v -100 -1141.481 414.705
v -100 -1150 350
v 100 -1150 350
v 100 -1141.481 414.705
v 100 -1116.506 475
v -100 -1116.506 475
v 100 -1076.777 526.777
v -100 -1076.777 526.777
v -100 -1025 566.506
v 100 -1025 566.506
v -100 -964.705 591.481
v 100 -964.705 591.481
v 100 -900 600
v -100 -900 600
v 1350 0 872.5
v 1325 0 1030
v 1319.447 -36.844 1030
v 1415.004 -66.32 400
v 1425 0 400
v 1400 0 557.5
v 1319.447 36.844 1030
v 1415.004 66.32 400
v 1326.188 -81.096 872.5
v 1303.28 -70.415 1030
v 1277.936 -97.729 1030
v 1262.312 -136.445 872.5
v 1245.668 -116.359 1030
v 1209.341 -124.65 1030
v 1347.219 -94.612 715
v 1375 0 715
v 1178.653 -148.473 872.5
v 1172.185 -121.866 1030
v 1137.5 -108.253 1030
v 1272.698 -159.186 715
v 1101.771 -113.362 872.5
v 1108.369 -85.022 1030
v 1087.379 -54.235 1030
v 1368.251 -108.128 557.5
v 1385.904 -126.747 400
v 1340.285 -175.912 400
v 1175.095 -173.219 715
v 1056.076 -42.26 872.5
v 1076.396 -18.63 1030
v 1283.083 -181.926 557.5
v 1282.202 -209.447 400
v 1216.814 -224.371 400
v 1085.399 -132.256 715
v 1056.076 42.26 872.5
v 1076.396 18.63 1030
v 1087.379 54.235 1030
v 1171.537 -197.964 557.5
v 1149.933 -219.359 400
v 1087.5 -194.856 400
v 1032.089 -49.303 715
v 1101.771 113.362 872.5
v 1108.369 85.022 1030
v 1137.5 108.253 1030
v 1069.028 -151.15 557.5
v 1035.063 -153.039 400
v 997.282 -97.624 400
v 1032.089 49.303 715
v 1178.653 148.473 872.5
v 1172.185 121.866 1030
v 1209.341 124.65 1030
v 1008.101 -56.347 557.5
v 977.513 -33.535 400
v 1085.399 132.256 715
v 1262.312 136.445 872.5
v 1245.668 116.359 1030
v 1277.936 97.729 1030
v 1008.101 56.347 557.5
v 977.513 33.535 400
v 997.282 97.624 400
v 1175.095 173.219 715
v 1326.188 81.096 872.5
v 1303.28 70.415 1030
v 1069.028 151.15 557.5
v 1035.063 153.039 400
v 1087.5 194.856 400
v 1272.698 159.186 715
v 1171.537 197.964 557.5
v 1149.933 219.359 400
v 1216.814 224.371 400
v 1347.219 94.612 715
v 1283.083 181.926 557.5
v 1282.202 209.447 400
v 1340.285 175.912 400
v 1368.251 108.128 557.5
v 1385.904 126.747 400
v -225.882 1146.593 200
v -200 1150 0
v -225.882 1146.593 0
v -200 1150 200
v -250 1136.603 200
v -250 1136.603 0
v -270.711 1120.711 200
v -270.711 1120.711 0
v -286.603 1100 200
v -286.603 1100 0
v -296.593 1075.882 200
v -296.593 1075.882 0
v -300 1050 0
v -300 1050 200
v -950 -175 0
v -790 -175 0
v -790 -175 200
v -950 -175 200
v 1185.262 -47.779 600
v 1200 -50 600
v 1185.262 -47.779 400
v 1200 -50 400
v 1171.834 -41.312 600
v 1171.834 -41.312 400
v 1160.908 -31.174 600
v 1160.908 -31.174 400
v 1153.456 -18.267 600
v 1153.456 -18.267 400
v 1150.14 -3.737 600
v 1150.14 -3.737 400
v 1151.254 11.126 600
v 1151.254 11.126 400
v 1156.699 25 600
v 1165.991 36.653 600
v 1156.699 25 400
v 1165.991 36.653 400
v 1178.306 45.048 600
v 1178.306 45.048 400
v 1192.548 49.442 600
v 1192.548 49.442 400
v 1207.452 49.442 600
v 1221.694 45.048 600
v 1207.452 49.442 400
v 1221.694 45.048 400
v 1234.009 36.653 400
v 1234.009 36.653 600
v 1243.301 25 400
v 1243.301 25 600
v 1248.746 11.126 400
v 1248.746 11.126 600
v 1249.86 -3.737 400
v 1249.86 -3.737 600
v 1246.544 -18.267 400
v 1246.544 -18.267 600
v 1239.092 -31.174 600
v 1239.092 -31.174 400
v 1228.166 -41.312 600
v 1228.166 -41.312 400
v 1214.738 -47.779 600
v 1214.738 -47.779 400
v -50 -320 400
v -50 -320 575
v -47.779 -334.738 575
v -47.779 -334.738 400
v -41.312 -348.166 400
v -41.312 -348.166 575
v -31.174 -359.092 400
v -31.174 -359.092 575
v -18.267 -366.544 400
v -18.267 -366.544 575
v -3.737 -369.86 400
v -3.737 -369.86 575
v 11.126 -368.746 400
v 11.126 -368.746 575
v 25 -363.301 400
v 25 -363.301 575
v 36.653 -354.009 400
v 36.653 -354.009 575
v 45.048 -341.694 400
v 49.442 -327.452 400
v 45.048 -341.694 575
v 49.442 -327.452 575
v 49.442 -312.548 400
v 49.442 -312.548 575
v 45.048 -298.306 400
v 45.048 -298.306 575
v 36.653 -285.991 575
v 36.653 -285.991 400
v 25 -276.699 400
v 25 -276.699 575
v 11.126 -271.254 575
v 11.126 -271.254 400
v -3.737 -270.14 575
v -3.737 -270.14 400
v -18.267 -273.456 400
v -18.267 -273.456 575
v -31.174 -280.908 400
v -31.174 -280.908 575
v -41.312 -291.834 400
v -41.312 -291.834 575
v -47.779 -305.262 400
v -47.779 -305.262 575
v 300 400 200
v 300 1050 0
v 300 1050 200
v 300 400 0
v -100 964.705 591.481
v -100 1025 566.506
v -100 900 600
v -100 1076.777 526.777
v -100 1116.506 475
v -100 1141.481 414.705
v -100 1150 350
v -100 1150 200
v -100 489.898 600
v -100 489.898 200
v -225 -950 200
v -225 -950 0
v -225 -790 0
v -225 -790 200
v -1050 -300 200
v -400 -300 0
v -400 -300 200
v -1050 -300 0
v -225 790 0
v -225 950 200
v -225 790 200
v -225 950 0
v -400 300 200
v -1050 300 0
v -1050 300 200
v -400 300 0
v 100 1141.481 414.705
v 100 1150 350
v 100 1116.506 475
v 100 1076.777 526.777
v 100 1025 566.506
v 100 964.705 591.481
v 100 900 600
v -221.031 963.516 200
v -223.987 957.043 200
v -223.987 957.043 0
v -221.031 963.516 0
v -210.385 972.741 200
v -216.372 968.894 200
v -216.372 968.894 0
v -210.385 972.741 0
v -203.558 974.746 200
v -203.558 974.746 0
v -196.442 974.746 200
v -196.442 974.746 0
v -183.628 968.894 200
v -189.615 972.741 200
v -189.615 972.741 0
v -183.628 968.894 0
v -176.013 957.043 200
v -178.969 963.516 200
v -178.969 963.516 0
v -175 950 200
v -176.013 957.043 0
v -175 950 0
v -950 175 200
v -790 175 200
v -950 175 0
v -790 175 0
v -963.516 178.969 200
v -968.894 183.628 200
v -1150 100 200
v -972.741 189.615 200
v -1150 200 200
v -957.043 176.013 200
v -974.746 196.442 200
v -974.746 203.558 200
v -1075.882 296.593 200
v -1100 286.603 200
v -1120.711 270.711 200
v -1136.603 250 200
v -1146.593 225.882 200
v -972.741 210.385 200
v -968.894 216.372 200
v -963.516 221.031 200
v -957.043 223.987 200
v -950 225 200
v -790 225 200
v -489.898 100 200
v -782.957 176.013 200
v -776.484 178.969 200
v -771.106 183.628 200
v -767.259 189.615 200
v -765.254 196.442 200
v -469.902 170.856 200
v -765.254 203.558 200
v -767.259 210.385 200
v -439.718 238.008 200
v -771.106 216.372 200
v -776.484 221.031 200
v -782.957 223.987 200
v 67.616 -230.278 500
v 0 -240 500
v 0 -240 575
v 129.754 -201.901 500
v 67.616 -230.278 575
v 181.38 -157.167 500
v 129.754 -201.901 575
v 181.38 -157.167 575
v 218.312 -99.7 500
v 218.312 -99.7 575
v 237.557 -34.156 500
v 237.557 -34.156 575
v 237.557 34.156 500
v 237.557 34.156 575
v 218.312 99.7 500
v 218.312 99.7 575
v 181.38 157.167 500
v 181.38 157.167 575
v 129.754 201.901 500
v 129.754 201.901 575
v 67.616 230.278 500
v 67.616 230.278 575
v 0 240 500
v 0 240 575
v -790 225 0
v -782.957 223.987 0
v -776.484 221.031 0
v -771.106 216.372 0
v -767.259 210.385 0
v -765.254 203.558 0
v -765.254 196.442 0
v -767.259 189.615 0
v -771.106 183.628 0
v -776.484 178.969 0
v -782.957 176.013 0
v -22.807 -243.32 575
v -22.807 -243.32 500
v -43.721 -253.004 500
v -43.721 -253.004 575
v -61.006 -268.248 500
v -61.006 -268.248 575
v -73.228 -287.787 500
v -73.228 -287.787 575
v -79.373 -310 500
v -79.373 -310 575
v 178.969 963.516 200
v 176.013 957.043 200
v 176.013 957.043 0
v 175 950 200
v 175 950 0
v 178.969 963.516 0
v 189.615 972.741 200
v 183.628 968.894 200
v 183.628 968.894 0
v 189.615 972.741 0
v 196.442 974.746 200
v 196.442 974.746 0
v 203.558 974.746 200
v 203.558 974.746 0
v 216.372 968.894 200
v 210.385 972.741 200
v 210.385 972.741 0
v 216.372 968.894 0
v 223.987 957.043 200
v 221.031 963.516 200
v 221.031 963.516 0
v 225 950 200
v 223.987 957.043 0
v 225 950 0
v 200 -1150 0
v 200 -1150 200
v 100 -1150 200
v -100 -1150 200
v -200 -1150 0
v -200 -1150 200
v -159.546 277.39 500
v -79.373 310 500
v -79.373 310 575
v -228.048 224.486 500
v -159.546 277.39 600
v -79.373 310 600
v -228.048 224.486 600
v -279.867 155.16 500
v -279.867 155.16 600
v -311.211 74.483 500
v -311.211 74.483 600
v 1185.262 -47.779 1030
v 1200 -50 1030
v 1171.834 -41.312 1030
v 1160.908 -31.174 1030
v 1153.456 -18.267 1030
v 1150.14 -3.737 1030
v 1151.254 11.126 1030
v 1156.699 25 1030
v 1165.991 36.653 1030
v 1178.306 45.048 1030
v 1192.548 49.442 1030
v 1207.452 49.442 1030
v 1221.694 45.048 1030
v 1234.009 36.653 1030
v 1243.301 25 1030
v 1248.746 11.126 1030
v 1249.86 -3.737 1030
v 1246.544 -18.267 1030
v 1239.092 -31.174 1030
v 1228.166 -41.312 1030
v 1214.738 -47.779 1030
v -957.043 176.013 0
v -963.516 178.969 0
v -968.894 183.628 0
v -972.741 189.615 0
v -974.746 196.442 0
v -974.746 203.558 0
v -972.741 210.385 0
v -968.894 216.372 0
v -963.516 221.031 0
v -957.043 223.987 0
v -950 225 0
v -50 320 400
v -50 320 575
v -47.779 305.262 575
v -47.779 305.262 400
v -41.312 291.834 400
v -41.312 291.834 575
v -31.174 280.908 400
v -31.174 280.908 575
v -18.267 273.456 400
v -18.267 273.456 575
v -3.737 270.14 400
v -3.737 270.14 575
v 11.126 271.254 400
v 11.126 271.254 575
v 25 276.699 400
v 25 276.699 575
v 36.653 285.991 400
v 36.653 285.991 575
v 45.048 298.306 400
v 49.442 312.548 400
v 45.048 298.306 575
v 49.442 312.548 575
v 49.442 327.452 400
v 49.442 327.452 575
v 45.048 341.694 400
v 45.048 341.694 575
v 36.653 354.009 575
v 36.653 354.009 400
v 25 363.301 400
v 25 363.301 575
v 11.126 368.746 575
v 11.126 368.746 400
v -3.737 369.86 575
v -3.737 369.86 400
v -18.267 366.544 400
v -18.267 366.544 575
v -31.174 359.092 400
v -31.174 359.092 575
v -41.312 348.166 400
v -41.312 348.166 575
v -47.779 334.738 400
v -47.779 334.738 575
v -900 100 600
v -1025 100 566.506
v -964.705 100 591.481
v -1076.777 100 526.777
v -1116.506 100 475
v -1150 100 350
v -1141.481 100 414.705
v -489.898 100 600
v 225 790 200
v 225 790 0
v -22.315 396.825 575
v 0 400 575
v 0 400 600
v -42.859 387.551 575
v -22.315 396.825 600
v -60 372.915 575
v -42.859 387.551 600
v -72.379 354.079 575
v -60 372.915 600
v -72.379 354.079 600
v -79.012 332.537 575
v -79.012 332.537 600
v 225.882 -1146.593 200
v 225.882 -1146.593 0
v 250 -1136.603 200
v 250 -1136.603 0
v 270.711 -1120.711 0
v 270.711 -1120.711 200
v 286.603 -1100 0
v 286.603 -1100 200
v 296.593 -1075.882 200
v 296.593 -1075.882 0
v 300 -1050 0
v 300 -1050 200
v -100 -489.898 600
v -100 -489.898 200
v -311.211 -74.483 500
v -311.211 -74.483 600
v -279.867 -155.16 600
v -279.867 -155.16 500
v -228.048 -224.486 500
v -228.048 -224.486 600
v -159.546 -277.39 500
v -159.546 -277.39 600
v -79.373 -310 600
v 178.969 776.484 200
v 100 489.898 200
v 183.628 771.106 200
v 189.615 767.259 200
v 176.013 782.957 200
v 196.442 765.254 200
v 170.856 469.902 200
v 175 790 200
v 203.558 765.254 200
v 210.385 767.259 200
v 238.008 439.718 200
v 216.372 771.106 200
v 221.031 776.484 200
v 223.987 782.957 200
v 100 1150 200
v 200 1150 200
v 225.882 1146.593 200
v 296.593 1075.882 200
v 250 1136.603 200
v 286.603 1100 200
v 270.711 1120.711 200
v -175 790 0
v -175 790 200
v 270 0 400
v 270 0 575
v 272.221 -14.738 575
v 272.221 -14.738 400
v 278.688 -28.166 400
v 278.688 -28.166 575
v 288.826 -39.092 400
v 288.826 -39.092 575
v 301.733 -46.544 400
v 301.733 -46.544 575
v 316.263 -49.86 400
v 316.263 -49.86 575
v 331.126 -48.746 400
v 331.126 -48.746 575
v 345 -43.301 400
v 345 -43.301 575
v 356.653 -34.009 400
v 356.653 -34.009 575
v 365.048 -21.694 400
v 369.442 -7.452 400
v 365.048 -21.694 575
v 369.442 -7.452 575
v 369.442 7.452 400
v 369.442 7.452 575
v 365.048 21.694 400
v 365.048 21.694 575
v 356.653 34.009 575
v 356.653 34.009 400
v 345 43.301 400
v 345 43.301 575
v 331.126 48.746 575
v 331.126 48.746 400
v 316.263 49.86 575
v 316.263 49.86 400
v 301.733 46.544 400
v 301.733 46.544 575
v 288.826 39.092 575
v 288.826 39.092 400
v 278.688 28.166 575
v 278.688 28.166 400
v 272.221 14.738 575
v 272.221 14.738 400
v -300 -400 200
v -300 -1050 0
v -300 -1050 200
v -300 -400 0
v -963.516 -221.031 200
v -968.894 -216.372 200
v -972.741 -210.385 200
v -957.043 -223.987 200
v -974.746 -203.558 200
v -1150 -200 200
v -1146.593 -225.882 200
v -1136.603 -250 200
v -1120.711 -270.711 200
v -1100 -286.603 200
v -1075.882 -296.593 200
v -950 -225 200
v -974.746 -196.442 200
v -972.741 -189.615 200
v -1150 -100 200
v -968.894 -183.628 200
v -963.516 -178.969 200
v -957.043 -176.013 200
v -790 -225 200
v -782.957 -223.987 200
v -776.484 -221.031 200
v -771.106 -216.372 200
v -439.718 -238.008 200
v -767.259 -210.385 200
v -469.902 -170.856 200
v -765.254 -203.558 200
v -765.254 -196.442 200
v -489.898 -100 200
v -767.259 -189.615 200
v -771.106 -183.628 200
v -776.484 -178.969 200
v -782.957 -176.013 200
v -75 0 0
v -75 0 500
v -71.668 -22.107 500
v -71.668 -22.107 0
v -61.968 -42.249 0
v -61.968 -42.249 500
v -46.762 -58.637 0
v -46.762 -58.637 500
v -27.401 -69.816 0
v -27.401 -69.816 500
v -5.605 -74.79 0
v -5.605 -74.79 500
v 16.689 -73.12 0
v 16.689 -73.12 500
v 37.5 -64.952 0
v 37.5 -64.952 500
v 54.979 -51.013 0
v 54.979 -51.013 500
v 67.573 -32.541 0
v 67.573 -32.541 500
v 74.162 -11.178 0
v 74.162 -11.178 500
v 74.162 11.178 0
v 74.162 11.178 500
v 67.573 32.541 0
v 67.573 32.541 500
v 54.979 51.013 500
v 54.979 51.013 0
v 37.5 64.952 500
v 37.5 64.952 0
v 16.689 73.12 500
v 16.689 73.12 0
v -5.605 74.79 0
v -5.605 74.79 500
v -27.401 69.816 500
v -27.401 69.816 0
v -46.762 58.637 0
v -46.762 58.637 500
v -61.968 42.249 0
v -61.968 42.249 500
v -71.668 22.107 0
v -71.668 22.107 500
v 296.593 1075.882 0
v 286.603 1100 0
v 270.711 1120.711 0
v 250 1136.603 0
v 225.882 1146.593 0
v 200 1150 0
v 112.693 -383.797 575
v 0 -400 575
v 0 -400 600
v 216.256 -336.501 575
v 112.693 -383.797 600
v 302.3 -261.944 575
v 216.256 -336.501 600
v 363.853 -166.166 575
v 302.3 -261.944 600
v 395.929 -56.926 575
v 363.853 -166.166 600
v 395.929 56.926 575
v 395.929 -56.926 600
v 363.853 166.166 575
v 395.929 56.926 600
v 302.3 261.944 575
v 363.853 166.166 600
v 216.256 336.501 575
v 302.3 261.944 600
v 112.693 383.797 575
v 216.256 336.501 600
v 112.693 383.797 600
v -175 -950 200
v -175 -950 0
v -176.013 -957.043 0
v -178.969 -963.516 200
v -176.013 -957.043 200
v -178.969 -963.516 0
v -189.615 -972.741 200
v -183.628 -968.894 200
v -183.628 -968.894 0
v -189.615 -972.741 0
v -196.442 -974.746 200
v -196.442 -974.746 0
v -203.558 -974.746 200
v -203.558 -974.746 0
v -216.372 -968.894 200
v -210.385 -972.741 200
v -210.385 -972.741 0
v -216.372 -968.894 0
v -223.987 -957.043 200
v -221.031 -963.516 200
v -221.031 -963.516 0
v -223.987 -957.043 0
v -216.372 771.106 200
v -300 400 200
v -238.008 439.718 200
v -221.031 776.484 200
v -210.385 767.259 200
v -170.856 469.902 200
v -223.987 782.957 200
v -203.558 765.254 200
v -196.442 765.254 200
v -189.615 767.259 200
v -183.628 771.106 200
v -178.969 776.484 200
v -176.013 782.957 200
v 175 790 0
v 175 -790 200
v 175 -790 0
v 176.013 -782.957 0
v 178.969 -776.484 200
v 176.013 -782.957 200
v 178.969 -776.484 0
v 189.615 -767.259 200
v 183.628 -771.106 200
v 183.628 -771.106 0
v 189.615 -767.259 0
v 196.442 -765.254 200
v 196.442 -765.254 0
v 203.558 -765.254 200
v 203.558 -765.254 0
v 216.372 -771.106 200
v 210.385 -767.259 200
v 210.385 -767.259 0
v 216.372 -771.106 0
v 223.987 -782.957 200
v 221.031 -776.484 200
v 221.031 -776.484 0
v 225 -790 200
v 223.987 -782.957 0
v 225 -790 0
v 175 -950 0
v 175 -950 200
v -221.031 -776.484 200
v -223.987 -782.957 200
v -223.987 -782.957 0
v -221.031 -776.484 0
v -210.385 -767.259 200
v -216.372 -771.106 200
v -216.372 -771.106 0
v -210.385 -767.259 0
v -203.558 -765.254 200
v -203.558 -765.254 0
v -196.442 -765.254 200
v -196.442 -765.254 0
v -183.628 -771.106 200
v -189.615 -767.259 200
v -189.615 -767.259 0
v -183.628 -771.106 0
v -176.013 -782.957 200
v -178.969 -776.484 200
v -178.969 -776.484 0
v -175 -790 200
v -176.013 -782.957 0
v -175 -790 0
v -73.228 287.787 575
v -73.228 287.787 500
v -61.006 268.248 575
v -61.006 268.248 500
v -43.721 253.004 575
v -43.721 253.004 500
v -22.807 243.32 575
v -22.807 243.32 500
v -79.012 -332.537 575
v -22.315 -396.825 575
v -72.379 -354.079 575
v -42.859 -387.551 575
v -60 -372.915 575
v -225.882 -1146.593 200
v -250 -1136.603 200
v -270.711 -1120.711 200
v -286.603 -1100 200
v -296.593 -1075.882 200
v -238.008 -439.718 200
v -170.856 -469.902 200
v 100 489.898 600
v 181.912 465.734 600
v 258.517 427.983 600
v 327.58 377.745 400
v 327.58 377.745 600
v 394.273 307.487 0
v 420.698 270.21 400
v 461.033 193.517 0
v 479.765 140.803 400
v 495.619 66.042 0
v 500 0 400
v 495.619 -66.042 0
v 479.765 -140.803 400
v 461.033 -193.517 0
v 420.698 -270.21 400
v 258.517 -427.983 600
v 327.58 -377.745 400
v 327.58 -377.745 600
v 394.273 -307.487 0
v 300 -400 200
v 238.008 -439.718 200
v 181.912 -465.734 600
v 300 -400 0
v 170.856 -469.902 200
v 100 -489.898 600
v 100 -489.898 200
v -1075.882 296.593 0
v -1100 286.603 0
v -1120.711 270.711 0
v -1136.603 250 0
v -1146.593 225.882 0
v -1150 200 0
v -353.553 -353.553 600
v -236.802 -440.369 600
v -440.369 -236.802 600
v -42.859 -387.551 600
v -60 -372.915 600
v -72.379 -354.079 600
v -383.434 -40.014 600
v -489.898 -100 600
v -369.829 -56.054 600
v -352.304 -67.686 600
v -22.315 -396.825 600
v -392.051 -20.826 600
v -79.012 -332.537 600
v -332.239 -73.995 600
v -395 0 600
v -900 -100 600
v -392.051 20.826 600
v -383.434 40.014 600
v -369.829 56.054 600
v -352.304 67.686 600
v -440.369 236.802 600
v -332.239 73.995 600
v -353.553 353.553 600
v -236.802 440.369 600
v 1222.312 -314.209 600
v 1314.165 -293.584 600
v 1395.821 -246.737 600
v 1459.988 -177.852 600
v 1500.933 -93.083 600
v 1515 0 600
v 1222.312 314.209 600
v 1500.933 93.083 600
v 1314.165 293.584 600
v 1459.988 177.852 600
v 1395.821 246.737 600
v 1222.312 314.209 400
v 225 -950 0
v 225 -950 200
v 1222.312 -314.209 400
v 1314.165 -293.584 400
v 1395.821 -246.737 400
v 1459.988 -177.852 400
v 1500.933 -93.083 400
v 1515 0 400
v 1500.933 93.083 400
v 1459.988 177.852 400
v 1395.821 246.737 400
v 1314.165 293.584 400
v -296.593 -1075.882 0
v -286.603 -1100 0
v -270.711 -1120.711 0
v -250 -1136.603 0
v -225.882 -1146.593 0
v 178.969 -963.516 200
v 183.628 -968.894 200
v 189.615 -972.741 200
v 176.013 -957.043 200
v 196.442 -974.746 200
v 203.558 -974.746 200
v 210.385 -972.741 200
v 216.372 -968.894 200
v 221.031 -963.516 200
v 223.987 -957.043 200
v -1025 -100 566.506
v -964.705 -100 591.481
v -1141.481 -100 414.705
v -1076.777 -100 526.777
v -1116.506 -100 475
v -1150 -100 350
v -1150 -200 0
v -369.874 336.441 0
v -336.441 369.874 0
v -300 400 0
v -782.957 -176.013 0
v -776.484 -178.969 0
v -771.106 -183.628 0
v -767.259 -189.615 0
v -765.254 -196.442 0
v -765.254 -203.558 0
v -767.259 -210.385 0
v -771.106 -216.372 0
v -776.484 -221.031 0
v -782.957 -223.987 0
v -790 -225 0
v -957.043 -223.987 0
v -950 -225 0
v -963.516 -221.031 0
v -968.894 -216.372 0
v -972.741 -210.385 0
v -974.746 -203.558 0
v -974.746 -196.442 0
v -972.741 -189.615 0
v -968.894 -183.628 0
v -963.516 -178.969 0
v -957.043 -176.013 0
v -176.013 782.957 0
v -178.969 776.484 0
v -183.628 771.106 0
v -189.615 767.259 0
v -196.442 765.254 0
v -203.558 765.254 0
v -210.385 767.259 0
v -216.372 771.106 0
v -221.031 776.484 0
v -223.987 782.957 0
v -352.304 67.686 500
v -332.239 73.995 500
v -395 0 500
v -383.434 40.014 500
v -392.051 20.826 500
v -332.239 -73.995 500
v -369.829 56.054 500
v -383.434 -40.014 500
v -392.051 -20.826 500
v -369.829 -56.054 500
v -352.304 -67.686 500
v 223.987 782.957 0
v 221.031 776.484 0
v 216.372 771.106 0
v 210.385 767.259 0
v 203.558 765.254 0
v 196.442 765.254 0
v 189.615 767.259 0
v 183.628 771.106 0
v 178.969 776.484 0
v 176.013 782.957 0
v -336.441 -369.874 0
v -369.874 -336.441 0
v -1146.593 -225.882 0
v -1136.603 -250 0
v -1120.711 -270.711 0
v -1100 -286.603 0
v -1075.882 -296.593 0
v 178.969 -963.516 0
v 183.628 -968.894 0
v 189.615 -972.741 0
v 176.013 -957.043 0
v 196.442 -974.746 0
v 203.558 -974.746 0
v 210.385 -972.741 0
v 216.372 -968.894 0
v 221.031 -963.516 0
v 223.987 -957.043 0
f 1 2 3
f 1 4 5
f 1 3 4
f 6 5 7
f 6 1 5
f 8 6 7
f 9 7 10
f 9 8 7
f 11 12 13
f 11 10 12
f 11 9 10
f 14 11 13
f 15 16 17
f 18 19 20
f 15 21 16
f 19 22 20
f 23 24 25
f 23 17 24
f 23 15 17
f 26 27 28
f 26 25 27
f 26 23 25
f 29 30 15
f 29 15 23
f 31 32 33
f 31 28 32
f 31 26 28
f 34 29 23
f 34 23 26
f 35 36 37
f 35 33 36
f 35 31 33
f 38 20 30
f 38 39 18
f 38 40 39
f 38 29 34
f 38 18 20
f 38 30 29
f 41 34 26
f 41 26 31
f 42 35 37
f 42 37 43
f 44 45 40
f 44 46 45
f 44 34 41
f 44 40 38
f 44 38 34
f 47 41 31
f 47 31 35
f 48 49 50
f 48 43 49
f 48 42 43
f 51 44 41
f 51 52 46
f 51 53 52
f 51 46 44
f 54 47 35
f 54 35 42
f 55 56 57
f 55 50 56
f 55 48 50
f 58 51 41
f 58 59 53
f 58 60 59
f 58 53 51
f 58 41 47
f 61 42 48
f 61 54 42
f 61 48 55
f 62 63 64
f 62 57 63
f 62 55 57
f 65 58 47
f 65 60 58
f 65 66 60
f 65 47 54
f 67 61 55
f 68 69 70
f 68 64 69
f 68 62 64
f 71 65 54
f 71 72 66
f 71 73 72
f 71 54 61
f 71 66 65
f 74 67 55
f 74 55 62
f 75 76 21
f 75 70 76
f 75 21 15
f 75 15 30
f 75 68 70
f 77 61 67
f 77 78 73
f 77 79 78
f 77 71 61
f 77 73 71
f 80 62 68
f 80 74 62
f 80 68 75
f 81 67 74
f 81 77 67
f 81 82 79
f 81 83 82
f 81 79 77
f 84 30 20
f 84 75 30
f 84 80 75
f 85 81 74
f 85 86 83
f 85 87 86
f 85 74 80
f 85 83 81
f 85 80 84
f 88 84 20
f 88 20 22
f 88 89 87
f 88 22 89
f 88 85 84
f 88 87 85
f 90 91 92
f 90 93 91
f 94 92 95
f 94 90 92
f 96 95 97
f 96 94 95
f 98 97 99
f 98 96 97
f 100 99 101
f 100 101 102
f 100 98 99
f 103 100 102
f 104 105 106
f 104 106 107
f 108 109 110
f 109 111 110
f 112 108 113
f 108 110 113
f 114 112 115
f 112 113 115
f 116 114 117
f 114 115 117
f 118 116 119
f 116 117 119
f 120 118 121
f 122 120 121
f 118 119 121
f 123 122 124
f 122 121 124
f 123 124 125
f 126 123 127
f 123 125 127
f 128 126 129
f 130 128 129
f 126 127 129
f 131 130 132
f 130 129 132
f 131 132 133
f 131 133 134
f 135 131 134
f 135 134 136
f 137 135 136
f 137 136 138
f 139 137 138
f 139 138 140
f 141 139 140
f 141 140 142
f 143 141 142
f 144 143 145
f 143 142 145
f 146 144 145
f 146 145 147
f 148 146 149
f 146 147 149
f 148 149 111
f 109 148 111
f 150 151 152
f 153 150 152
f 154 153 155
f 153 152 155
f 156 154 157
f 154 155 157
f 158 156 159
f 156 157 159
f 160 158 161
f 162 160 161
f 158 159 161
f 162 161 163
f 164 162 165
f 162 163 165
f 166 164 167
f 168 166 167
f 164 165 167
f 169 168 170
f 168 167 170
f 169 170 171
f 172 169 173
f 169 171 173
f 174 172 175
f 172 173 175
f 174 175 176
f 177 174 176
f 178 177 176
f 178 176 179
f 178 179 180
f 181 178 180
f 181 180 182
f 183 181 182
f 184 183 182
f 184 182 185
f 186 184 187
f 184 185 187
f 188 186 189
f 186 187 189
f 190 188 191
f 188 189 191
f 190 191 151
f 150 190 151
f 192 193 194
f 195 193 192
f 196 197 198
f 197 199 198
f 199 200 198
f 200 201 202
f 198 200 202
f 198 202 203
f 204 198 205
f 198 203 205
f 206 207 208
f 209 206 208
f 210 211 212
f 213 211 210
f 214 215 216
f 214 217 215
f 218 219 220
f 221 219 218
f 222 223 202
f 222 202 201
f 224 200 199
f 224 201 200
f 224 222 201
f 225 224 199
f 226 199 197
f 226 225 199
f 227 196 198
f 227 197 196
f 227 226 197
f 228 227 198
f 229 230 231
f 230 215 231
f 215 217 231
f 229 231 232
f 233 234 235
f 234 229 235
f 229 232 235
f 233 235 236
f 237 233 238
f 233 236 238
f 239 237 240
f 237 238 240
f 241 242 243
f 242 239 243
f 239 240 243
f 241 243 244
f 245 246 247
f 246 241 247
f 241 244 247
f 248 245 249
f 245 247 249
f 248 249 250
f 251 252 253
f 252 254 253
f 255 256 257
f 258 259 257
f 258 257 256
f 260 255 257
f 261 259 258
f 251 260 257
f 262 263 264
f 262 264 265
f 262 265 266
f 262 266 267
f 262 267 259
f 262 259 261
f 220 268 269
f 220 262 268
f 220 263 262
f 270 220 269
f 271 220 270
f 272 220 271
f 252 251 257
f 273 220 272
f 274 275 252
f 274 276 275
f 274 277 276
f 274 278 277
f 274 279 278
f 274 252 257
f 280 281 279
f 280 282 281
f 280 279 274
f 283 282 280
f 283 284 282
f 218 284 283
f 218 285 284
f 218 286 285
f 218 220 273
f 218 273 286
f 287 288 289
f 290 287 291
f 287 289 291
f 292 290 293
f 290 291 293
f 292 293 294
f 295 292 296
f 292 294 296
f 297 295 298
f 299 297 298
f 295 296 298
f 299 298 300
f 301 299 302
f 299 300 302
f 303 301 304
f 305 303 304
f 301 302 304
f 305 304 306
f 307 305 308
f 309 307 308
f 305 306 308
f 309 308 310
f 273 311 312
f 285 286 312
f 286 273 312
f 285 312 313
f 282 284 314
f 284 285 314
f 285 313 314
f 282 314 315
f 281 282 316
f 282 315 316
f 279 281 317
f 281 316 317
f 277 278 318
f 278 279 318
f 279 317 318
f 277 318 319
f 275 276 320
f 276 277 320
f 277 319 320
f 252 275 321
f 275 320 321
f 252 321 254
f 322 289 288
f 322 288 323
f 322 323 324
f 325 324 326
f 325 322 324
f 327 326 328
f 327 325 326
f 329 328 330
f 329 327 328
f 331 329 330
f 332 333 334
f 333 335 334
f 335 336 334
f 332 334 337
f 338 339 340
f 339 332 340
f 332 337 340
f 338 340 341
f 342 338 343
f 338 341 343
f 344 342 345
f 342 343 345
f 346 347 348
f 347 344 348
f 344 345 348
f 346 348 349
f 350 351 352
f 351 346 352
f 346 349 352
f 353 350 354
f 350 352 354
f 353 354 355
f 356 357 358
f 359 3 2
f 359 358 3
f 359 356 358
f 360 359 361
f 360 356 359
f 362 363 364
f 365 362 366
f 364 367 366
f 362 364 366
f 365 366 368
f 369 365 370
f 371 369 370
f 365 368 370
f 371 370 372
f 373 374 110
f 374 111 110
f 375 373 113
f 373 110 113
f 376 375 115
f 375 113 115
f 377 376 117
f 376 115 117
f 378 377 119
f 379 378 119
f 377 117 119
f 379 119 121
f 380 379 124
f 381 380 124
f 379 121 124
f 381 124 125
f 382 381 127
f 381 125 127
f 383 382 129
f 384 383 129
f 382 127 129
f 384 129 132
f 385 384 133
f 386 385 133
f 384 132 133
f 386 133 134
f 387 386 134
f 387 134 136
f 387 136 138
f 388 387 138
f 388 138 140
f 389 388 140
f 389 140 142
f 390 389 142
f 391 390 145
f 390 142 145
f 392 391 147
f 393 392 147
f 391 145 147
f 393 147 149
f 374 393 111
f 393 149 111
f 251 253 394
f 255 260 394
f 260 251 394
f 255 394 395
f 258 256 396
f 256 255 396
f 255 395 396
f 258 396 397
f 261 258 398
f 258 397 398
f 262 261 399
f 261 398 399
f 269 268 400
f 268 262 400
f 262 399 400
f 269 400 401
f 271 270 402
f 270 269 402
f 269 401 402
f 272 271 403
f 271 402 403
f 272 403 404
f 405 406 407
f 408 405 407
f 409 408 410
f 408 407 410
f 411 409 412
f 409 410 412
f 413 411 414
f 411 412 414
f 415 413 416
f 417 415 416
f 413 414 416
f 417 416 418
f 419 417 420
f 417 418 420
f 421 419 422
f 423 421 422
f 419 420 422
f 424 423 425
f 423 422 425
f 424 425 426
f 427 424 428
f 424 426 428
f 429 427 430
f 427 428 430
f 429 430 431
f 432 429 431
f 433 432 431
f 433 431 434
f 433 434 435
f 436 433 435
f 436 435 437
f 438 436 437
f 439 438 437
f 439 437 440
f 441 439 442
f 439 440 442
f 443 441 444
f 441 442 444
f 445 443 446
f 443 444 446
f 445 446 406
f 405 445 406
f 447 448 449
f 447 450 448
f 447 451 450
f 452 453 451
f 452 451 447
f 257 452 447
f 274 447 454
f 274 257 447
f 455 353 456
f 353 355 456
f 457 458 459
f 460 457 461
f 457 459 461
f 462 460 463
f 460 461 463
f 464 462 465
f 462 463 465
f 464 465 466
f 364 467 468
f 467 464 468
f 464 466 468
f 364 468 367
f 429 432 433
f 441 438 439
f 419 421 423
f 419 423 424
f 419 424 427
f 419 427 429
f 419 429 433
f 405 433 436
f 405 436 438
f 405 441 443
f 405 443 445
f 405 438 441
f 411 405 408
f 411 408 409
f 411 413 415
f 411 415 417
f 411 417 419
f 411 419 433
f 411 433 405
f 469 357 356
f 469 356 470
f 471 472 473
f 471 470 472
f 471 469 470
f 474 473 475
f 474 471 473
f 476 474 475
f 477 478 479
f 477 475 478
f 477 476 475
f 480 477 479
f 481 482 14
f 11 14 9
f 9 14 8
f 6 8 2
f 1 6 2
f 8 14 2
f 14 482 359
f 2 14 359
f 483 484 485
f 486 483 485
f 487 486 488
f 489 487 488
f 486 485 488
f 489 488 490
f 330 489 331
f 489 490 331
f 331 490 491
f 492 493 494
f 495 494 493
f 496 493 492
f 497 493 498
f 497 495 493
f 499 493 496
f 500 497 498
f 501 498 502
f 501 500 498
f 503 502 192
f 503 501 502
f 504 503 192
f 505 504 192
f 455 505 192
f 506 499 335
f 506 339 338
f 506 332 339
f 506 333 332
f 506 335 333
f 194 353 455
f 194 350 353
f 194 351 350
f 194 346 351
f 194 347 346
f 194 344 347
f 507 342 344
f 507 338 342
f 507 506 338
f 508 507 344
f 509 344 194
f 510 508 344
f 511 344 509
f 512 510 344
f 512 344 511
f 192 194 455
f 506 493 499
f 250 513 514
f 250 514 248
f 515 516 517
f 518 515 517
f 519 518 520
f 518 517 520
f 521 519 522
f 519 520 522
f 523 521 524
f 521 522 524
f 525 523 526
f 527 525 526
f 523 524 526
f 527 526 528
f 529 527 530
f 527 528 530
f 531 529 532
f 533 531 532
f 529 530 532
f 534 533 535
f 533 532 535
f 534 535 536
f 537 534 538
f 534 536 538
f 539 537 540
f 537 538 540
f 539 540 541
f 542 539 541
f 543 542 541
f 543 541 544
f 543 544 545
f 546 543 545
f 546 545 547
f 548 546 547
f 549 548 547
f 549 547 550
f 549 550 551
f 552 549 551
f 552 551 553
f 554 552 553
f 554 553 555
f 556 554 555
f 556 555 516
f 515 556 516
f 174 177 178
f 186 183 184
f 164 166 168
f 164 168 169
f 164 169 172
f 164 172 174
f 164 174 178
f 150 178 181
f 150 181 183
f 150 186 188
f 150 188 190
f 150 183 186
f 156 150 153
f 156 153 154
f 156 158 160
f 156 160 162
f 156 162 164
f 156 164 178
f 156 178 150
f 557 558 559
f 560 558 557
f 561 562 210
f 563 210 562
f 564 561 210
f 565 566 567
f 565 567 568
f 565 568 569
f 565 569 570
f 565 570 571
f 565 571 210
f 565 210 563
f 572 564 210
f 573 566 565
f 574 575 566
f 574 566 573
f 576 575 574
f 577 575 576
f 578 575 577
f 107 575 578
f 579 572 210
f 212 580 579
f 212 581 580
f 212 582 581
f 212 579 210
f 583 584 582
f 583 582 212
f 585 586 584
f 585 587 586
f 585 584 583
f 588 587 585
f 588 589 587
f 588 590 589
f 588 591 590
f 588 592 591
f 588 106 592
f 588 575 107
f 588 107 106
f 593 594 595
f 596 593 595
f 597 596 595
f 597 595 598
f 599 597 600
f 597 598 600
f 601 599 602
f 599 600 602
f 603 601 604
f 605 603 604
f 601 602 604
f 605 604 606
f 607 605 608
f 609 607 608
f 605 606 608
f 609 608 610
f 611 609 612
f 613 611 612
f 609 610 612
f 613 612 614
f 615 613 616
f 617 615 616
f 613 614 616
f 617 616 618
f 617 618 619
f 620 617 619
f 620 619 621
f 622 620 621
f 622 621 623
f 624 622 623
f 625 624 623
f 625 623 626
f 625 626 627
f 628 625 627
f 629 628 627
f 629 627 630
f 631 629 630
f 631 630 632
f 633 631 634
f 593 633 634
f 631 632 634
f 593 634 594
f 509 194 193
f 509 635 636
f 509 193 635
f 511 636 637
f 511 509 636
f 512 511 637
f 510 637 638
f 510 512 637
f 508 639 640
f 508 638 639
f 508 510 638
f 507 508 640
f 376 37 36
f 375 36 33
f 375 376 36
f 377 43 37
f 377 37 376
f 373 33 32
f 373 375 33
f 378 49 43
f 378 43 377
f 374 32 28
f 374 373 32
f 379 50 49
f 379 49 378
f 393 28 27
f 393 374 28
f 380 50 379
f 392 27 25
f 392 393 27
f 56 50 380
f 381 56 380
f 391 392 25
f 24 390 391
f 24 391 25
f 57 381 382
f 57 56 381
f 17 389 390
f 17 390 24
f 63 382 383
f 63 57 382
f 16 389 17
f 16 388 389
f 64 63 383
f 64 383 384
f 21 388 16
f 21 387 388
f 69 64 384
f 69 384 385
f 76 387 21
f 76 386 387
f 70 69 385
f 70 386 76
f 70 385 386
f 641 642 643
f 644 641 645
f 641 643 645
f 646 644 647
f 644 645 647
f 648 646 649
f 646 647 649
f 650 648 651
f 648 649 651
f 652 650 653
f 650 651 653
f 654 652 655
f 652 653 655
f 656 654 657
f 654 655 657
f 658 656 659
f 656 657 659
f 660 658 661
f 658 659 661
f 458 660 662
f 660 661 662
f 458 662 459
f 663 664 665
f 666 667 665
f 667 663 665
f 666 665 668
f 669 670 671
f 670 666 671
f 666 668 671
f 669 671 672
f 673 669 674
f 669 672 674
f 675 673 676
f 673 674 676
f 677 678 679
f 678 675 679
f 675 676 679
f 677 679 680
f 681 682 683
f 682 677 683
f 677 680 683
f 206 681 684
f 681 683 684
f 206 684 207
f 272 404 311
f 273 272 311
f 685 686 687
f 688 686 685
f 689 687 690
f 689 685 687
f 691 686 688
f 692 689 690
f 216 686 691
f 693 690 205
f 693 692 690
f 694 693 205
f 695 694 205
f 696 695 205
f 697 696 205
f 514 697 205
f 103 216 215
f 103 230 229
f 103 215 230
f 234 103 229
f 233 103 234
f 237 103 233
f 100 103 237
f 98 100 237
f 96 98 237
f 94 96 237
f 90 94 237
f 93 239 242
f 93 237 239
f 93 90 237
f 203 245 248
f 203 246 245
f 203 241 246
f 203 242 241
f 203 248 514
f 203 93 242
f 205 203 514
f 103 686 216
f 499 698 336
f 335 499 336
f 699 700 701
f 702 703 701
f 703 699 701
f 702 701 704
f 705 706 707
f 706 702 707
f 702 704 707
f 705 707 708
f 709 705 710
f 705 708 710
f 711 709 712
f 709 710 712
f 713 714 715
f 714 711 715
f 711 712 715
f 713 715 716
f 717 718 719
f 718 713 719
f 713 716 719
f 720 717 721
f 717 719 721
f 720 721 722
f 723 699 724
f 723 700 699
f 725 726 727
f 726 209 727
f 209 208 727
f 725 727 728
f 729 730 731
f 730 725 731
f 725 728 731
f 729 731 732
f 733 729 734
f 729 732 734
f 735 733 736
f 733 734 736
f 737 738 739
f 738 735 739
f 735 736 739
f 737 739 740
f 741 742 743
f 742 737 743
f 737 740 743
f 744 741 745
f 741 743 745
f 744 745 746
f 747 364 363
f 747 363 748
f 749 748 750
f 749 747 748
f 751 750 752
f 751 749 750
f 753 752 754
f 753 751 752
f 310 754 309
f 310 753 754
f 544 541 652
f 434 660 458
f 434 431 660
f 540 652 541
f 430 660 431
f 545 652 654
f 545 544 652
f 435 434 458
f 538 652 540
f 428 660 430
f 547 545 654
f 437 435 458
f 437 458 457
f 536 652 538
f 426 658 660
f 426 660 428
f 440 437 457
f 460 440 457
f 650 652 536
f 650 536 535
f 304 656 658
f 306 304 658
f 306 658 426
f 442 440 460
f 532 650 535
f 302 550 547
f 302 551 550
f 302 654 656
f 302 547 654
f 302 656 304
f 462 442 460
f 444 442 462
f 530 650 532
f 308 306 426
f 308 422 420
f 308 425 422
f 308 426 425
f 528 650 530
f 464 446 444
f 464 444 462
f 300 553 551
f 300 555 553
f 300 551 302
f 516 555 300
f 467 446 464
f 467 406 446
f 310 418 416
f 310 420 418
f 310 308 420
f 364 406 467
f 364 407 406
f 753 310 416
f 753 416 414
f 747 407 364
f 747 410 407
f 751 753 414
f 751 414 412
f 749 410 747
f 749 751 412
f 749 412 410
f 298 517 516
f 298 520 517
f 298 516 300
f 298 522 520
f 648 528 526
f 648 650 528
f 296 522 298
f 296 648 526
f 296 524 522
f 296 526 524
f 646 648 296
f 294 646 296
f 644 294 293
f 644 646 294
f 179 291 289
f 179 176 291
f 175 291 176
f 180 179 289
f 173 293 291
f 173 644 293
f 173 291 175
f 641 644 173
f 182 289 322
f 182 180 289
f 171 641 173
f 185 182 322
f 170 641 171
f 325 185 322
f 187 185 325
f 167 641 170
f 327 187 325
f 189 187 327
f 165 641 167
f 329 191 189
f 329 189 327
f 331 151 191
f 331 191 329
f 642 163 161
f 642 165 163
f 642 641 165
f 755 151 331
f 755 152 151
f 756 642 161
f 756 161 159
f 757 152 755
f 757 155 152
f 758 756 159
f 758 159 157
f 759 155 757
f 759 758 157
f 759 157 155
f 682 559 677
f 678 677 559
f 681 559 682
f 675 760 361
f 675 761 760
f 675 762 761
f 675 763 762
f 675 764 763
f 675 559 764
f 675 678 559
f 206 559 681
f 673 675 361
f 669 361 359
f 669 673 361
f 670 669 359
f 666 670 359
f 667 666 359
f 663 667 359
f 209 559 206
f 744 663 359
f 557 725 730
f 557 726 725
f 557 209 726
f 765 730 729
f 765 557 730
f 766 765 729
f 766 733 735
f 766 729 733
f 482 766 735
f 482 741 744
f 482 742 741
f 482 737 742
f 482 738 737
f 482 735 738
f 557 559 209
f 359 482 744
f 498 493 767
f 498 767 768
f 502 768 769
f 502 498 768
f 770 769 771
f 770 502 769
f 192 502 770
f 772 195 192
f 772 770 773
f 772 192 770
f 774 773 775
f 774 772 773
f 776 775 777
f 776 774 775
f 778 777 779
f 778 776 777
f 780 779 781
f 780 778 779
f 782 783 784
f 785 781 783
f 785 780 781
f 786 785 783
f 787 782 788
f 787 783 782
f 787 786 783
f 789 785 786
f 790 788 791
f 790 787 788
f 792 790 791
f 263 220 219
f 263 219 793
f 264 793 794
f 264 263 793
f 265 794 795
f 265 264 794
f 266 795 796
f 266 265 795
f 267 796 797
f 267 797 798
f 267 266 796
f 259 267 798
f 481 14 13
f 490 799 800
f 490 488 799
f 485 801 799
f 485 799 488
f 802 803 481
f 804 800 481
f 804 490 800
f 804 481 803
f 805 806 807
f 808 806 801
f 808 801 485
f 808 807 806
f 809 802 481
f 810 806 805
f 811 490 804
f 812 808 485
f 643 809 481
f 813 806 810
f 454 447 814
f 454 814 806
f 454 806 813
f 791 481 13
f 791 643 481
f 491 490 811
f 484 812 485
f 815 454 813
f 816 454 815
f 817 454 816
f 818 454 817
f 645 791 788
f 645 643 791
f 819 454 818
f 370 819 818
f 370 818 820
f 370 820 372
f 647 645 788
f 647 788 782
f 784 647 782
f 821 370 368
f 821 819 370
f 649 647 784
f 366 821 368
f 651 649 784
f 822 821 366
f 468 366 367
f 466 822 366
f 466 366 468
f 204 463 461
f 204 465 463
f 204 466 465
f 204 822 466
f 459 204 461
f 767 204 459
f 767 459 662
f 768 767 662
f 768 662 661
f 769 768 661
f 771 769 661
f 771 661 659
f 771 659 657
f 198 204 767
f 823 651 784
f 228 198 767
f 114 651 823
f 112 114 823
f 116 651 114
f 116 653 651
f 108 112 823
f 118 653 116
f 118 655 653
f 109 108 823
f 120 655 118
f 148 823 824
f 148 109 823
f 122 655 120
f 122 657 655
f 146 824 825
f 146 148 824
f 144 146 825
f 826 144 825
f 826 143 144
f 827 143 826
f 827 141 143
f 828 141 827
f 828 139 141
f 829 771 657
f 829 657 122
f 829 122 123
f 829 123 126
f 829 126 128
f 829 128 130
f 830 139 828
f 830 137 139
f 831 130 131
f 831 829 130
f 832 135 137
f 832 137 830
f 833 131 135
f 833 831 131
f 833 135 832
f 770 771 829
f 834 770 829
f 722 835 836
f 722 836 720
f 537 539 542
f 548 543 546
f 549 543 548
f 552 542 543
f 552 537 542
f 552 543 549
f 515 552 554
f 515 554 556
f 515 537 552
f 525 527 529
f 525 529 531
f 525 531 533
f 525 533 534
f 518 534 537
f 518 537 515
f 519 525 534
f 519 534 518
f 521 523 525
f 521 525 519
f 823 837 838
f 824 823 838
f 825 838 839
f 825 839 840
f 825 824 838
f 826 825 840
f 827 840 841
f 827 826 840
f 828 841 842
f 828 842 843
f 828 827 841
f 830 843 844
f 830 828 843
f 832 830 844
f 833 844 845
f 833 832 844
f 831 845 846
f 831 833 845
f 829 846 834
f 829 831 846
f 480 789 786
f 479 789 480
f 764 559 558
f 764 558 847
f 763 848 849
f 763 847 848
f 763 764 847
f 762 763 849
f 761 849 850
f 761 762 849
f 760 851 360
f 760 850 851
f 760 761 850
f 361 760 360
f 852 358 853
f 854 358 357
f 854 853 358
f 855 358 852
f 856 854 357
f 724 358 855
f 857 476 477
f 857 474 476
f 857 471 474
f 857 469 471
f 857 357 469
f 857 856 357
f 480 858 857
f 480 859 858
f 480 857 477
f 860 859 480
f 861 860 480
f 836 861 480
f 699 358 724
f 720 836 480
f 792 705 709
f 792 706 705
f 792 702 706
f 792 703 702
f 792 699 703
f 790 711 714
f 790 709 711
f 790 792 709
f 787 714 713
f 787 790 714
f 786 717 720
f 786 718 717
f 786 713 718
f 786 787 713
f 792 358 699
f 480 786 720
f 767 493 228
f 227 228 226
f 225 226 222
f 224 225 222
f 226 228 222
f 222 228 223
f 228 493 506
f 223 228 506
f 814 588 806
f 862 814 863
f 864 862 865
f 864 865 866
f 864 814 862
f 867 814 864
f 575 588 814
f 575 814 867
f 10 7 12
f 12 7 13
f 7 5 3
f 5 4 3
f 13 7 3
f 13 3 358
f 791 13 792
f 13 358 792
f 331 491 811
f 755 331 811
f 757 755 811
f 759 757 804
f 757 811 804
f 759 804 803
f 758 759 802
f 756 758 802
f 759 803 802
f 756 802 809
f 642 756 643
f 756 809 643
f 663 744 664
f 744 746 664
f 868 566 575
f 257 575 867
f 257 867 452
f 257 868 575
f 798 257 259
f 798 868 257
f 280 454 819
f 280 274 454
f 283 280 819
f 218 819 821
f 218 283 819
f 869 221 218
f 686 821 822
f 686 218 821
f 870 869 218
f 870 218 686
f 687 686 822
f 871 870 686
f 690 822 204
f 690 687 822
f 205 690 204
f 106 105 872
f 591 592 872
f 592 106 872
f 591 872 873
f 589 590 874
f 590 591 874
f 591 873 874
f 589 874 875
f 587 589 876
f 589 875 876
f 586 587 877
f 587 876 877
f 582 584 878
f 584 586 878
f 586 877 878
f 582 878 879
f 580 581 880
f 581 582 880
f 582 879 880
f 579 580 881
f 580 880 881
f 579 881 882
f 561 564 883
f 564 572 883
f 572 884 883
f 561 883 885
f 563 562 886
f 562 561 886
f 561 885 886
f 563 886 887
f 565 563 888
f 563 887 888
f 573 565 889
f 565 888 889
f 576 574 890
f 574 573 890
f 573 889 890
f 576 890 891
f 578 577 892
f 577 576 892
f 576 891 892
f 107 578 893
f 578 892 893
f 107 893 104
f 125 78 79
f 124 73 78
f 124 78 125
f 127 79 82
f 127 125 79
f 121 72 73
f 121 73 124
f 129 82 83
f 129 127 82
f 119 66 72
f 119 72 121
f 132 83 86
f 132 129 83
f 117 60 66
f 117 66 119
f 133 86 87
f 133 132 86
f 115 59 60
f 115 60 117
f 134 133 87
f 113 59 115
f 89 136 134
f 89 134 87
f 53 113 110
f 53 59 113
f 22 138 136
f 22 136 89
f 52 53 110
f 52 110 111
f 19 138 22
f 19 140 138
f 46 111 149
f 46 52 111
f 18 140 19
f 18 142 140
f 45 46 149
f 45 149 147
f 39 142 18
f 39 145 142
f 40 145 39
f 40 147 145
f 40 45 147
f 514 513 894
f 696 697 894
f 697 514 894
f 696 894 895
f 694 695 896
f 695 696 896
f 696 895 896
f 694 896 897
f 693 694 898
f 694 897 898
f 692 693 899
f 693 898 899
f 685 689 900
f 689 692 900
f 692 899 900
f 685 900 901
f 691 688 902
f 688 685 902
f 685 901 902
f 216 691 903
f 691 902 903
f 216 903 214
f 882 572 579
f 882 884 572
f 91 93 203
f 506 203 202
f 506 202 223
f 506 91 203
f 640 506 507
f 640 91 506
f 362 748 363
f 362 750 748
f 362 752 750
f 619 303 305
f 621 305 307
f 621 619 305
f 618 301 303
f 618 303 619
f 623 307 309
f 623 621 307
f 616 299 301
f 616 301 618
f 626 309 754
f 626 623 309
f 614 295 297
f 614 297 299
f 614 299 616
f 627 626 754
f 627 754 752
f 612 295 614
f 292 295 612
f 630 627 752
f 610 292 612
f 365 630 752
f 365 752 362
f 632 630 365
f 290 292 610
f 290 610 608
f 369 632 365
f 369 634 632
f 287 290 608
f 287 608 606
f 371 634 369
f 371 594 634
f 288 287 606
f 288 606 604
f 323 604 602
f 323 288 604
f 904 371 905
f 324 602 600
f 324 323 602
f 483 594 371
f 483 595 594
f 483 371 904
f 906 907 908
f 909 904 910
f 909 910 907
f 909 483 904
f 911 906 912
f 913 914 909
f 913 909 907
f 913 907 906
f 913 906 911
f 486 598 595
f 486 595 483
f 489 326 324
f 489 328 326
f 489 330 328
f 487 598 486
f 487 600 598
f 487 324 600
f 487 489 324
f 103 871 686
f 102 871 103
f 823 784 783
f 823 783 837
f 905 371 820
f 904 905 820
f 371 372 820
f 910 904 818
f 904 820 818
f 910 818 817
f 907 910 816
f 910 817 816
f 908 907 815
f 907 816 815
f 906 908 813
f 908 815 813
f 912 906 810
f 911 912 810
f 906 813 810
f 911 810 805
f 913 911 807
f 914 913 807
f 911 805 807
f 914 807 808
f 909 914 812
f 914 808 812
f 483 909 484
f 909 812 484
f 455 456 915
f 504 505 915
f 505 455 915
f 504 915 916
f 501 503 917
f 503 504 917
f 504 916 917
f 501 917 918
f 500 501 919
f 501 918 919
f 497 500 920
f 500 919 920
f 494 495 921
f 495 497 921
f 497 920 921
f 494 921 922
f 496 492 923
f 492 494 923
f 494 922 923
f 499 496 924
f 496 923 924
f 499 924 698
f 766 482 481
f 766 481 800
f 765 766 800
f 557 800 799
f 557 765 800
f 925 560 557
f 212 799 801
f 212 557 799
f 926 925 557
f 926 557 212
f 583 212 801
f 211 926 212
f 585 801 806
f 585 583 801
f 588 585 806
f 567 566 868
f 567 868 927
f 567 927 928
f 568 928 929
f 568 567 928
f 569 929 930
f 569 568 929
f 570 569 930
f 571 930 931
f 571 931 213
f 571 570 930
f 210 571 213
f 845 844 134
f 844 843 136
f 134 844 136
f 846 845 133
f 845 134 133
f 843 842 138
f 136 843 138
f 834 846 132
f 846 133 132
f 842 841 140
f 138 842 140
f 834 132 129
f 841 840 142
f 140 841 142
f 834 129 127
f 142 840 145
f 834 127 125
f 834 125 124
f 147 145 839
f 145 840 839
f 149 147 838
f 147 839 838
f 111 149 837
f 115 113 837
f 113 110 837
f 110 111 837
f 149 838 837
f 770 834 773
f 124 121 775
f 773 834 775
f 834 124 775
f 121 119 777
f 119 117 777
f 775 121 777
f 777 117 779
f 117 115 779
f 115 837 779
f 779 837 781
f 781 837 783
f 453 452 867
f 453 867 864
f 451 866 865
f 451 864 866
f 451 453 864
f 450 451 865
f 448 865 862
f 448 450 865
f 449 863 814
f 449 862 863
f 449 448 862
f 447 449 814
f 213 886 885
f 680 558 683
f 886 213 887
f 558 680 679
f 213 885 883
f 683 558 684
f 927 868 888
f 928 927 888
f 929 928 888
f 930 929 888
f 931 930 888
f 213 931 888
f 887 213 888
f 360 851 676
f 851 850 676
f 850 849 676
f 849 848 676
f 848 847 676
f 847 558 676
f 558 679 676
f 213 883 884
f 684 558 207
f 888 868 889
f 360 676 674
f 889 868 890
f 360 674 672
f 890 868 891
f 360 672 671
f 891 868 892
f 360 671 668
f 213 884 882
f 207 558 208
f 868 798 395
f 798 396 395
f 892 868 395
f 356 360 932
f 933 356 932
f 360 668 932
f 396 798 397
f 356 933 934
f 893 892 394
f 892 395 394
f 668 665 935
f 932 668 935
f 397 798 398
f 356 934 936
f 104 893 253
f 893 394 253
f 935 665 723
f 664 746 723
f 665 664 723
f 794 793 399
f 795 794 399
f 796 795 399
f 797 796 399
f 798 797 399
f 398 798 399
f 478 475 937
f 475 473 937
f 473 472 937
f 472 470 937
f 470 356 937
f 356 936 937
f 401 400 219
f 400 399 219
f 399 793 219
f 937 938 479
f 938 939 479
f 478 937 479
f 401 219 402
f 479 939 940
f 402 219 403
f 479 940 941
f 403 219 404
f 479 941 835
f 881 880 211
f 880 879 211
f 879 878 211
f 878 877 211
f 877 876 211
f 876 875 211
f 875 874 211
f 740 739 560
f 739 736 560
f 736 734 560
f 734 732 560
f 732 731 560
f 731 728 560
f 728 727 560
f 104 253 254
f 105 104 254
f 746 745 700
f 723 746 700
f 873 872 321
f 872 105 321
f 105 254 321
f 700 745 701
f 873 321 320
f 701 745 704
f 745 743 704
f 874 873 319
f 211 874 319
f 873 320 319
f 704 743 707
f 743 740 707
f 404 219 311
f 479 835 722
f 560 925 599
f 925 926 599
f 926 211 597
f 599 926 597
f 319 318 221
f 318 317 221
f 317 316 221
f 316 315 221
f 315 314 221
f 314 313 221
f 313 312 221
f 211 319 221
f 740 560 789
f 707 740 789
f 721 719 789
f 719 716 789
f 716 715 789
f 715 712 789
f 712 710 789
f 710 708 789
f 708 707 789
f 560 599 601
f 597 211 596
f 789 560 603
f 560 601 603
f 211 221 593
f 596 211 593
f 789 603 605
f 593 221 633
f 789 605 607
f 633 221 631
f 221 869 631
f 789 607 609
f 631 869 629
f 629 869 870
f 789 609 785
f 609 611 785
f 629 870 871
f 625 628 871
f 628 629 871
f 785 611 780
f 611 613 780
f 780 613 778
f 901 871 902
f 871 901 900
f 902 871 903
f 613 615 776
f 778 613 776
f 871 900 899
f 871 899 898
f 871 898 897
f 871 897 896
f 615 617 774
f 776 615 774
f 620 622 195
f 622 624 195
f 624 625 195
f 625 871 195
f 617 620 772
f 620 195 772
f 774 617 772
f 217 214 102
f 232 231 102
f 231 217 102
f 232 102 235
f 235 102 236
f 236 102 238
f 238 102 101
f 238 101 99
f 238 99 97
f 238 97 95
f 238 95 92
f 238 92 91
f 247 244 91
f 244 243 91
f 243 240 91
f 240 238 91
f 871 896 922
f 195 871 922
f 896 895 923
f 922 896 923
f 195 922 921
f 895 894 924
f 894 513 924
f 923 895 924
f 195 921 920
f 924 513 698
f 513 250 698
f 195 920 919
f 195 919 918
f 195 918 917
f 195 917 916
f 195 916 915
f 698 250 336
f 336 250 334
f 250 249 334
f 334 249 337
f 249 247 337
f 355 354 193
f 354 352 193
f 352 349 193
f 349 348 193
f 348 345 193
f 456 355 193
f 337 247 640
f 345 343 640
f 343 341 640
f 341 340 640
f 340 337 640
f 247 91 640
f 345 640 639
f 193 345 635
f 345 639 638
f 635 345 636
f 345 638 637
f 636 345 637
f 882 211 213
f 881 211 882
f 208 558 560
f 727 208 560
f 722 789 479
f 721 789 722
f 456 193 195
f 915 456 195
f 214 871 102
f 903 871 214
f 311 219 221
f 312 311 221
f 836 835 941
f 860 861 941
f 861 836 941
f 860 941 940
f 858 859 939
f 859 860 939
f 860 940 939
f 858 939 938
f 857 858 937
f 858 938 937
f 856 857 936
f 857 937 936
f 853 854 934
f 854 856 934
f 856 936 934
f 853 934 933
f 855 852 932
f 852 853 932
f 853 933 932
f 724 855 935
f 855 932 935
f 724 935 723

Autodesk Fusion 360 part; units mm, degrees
sketch "Sketch1" plane through (0, 0, 0) normal (0, 0, 1) x (1, 0, 0)
  circle A0 centre (0, 0) radius 500
  line L0 (-1150, 300) -> (1150, 300)
  line L1 (1150, 300) -> (1150, -300)
  line L2 (1150, -300) -> (-1150, -300)
  line L3 (-1150, -300) -> (-1150, 300)
  line L4 (-300, 1150) -> (300, 1150)
  line L5 (300, 1150) -> (300, -1150)
  line L6 (300, -1150) -> (-300, -1150)
  line L7 (-300, -1150) -> (-300, 1150)
  line L8 (1150, -100) -> (-1150, -100)
  line L9 (-1150, -100) -> (-1150, 100)
  line L10 (-1150, 100) -> (1150, 100)
  line L11 (1150, 100) -> (1150, -100)
  line L12 (-100, -1150) -> (100, -1150)
  line L13 (100, -1150) -> (100, 1150)
  line L14 (100, 1150) -> (-100, 1150)
  line L15 (-100, 1150) -> (-100, -1150)
  line L16 (-950, -225) -> (-790, -225)
  arc A1 (-790, -225) -> (-790, -175) centre (-790, -200) ccw
  line L17 (-790, -175) -> (-950, -175)
  arc A2 (-950, -175) -> (-950, -225) centre (-950, -200) ccw
  line L18 (-950, -200) -> (-790, -200) construction
  line L19 (-1150, 0) -> (-827.9114, 0) construction
  arc A3 (-950, 225) -> (-950, 175) centre (-950, 200) ccw
  line L20 (-790, 175) -> (-950, 175)
  line L21 (-950, 225) -> (-790, 225)
  arc A4 (-790, 175) -> (-790, 225) centre (-790, 200) ccw
  line L22 (225, -950) -> (225, -790)
  line L23 (175, -790) -> (175, -950)
  arc A5 (175, -950) -> (225, -950) centre (200, -950) ccw
  arc A6 (225, -790) -> (175, -790) centre (200, -790) ccw
  line L24 (-175, -790) -> (-175, -950)
  line L25 (-225, -950) -> (-225, -790)
  arc A7 (-225, -950) -> (-175, -950) centre (-200, -950) ccw
  arc A8 (-175, -790) -> (-225, -790) centre (-200, -790) ccw
  line L26 (-225, 950) -> (-225, 790)
  line L27 (-175, 790) -> (-175, 950)
  arc A9 (-175, 950) -> (-225, 950) centre (-200, 950) ccw
  arc A10 (-225, 790) -> (-175, 790) centre (-200, 790) ccw
  line L28 (175, 790) -> (175, 950)
  line L29 (225, 950) -> (225, 790)
  arc A11 (225, 950) -> (175, 950) centre (200, 950) ccw
  arc A12 (175, 790) -> (225, 790) centre (200, 790) ccw
  dimension "d2" = 2300
  dimension "d3" = 600
  dimension "d4" = 600
  dimension "d5" = 2300
  dimension "d6" = 2300
  dimension "d7" = 200
  dimension "d8" = 200
  dimension "d9" = 2300
  dimension "d10" = 50
  dimension "d11" = 100
  dimension "d13" = 360
extrude "Extrude1" add sketch "Sketch1" along normal blind 600 contours A0 L5 L8 L10 | A0 L0 L5 L10 | A0 L2 L5 L8 | A0 L0 L5 | L0 L5 L10 L13 | L5 L8 L10 L13 | A0 L2 L5 | L2 L5 L8 L13 | A0 L0 L5 L13 | L8 L10 L13 L15 | L0 L10 L13 L15 | A0 L2 L5 L13 | L2 L8 L13 L15 | A0 L0 L13 L15 | A0 L4 L13 L14 L15 | L7 L8 L10 L15 | L0 L7 L10 L15 | A0 L6 L12 L13 L15 | A0 L2 L13 L15 | L2 L7 L8 L15 | A0 L0 L7 L15 | A0 L0 L7 L10 | A0 L7 L8 L10 | A0 L2 L7 L15 | A0 L2 L7 L8 | A0 L0 L7 | A0 L3 L8 L9 L10 | A0 L2 L7 makes body 1
extrude "Extrude2" add sketch "Sketch1" along normal blind 200 contours A0 L4 L5 L13 | A0 L5 L6 L13 | A0 L4 L7 L15 | A0 L6 L7 L15 | A0 L0 L3 L10 | A0 L2 L3 L8 bodies 1
sketch "Sketch2" plane through (0, 0, 600) normal (0, 0, 1) x (-1, 0, 0)
  arc A0 (489.8979, 100) -> (100, 489.8979) centre (0, 0) ccw
  line L0 (100, 489.8979) -> (100, 1150)
  line L1 (100, 1150) -> (-100, 1150)
  line L2 (-100, 1150) -> (-100, 489.8979)
  arc A1 (-100, 489.8979) -> (-100, -489.8979) centre (0, 0) ccw
  line L3 (-100, -489.8979) -> (-100, -1150)
  line L4 (-100, -1150) -> (100, -1150)
  line L5 (100, -1150) -> (100, -489.8979)
  arc A2 (100, -489.8979) -> (489.8979, -100) centre (0, 0) ccw
  line L6 (489.8979, -100) -> (1150, -100)
  line L7 (1150, -100) -> (1150, 100)
  line L8 (1150, 100) -> (489.8979, 100)
  circle A3 centre (0, 0) radius 400
  circle A4 centre (0, 0) radius 320
  circle A5 centre (0, 0) radius 240
  circle A6 centre (0, 0) radius 75
  circle A7 centre (320, 0) radius 75
  circle A8 centre (0, 320) radius 80
  circle A9 centre (0, -320) radius 80
  circle A10 centre (-320, 0) radius 50
  circle A11 centre (0, -320) radius 50
  circle A12 centre (0, 320) radius 50
  circle A13 centre (-1200, 0) radius 315
  line L9 (-28.3333, -398.9953) -> (-1222.3125, -314.2088)
  line L10 (0, 0) -> (-739.855, 0) construction
  line L11 (-28.3333, 398.9953) -> (-1222.3125, 314.2088)
  dimension "d21" = 150
  dimension "d22" = 150
  dimension "d23" = 160
  dimension "d24" = 160
  dimension "d25" = 100
  dimension "d26" = 100
  dimension "d27" = 100
  dimension "d28" = 630
  dimension "d30" = 2350
ref_plane "WorkPlane1" through (1200, 0, 1030) normal (0, 0, 1) x (-1, 0, 0)
sketch "Sketch3" plane through (1200, 0, 1030) normal (0, 0, 1) x (1, 0, 0)
  circle A0 centre (0, 0) radius 125
  dimension "d32" = 250
extrude "Extrude3" add sketch "Sketch2" against normal blind 200 contours A1 A13 L9 L11 | A13 bodies 1
extrude "Extrude4" cut sketch "Sketch2" against normal through all contours A6 bodies 1
extrude "Extrude5" cut sketch "Sketch2" against normal blind 100 contours A4 A5 A7 A8 A9 | A5 | A4 A7 | A4 A7 bodies 1
extrude "Extrude6" cut sketch "Sketch2" against normal blind 200 contours A4 A12 | A4 A12 | A4 A10 | A4 A10 | A4 A11 | A4 A11 bodies 1
extrude "Extrude7" cut sketch "Sketch2" against normal blind 25 contours A3 A4 A8 A9 A10 | A4 A8 A12 | A4 A9 A11 | A4 A5 A8 A9 A10 | A4 A8 A12 | A4 A9 A11 bodies 1
sketch "Sketch4" plane through (0, 0, 400) normal (0, 0, -1) x (1, 0, 0)
  arc A0 (1222.3125, -314.2088) -> (1222.3125, 314.2088) centre (1200, 0) ccw
  line L0 (1222.3125, 314.2088) -> (327.5798, 377.7453)
  arc A1 (327.5798, -377.7453) -> (327.5798, 377.7453) centre (0, 0) ccw
  line L1 (327.5798, -377.7453) -> (1222.3125, -314.2088)
  circle A2 centre (1200, 0) radius 225
  dimension "d42" = 450
loft "Loft1" add profiles "Sketch4", "Sketch3" section 1 contours A2 section 2 separate body makes body 2
sketch "Sketch5" plane through (0, -1150, 0) normal (0, -1, 0) x (1, 0, 0)
  line L0 (-300, 0) -> (300, 0)
  line L1 (300, 0) -> (300, 200)
  line L2 (300, 200) -> (100, 200)
  line L3 (100, 200) -> (100, 600)
  line L4 (100, 600) -> (-100, 600)
  line L5 (-100, 600) -> (-100, 200)
  line L6 (-100, 200) -> (-300, 200)
  line L7 (-300, 200) -> (-300, 0)
hole "Hole1" at (1200, 0, 1030) direction (0, 0, -1) diameter 100 end through all bodies 1 2
hole "Hole2" at (1200, 0, 400) direction (0, 0, 1) diameter 100 end through all bodies 2 1
fillet "Fillet1" radius 250 3 edges at (-1150, 0, 600) (0, -1150, 600) (0, 1150, 600) on bodies 1
fillet "Fillet2" radius 100 6 edges at (300, -1150, 100) (-300, -1150, 100) (-1150, -300, 100) (300, 1150, 100) (-1150, 300, 100) (-300, 1150, 100) on bodies 1
